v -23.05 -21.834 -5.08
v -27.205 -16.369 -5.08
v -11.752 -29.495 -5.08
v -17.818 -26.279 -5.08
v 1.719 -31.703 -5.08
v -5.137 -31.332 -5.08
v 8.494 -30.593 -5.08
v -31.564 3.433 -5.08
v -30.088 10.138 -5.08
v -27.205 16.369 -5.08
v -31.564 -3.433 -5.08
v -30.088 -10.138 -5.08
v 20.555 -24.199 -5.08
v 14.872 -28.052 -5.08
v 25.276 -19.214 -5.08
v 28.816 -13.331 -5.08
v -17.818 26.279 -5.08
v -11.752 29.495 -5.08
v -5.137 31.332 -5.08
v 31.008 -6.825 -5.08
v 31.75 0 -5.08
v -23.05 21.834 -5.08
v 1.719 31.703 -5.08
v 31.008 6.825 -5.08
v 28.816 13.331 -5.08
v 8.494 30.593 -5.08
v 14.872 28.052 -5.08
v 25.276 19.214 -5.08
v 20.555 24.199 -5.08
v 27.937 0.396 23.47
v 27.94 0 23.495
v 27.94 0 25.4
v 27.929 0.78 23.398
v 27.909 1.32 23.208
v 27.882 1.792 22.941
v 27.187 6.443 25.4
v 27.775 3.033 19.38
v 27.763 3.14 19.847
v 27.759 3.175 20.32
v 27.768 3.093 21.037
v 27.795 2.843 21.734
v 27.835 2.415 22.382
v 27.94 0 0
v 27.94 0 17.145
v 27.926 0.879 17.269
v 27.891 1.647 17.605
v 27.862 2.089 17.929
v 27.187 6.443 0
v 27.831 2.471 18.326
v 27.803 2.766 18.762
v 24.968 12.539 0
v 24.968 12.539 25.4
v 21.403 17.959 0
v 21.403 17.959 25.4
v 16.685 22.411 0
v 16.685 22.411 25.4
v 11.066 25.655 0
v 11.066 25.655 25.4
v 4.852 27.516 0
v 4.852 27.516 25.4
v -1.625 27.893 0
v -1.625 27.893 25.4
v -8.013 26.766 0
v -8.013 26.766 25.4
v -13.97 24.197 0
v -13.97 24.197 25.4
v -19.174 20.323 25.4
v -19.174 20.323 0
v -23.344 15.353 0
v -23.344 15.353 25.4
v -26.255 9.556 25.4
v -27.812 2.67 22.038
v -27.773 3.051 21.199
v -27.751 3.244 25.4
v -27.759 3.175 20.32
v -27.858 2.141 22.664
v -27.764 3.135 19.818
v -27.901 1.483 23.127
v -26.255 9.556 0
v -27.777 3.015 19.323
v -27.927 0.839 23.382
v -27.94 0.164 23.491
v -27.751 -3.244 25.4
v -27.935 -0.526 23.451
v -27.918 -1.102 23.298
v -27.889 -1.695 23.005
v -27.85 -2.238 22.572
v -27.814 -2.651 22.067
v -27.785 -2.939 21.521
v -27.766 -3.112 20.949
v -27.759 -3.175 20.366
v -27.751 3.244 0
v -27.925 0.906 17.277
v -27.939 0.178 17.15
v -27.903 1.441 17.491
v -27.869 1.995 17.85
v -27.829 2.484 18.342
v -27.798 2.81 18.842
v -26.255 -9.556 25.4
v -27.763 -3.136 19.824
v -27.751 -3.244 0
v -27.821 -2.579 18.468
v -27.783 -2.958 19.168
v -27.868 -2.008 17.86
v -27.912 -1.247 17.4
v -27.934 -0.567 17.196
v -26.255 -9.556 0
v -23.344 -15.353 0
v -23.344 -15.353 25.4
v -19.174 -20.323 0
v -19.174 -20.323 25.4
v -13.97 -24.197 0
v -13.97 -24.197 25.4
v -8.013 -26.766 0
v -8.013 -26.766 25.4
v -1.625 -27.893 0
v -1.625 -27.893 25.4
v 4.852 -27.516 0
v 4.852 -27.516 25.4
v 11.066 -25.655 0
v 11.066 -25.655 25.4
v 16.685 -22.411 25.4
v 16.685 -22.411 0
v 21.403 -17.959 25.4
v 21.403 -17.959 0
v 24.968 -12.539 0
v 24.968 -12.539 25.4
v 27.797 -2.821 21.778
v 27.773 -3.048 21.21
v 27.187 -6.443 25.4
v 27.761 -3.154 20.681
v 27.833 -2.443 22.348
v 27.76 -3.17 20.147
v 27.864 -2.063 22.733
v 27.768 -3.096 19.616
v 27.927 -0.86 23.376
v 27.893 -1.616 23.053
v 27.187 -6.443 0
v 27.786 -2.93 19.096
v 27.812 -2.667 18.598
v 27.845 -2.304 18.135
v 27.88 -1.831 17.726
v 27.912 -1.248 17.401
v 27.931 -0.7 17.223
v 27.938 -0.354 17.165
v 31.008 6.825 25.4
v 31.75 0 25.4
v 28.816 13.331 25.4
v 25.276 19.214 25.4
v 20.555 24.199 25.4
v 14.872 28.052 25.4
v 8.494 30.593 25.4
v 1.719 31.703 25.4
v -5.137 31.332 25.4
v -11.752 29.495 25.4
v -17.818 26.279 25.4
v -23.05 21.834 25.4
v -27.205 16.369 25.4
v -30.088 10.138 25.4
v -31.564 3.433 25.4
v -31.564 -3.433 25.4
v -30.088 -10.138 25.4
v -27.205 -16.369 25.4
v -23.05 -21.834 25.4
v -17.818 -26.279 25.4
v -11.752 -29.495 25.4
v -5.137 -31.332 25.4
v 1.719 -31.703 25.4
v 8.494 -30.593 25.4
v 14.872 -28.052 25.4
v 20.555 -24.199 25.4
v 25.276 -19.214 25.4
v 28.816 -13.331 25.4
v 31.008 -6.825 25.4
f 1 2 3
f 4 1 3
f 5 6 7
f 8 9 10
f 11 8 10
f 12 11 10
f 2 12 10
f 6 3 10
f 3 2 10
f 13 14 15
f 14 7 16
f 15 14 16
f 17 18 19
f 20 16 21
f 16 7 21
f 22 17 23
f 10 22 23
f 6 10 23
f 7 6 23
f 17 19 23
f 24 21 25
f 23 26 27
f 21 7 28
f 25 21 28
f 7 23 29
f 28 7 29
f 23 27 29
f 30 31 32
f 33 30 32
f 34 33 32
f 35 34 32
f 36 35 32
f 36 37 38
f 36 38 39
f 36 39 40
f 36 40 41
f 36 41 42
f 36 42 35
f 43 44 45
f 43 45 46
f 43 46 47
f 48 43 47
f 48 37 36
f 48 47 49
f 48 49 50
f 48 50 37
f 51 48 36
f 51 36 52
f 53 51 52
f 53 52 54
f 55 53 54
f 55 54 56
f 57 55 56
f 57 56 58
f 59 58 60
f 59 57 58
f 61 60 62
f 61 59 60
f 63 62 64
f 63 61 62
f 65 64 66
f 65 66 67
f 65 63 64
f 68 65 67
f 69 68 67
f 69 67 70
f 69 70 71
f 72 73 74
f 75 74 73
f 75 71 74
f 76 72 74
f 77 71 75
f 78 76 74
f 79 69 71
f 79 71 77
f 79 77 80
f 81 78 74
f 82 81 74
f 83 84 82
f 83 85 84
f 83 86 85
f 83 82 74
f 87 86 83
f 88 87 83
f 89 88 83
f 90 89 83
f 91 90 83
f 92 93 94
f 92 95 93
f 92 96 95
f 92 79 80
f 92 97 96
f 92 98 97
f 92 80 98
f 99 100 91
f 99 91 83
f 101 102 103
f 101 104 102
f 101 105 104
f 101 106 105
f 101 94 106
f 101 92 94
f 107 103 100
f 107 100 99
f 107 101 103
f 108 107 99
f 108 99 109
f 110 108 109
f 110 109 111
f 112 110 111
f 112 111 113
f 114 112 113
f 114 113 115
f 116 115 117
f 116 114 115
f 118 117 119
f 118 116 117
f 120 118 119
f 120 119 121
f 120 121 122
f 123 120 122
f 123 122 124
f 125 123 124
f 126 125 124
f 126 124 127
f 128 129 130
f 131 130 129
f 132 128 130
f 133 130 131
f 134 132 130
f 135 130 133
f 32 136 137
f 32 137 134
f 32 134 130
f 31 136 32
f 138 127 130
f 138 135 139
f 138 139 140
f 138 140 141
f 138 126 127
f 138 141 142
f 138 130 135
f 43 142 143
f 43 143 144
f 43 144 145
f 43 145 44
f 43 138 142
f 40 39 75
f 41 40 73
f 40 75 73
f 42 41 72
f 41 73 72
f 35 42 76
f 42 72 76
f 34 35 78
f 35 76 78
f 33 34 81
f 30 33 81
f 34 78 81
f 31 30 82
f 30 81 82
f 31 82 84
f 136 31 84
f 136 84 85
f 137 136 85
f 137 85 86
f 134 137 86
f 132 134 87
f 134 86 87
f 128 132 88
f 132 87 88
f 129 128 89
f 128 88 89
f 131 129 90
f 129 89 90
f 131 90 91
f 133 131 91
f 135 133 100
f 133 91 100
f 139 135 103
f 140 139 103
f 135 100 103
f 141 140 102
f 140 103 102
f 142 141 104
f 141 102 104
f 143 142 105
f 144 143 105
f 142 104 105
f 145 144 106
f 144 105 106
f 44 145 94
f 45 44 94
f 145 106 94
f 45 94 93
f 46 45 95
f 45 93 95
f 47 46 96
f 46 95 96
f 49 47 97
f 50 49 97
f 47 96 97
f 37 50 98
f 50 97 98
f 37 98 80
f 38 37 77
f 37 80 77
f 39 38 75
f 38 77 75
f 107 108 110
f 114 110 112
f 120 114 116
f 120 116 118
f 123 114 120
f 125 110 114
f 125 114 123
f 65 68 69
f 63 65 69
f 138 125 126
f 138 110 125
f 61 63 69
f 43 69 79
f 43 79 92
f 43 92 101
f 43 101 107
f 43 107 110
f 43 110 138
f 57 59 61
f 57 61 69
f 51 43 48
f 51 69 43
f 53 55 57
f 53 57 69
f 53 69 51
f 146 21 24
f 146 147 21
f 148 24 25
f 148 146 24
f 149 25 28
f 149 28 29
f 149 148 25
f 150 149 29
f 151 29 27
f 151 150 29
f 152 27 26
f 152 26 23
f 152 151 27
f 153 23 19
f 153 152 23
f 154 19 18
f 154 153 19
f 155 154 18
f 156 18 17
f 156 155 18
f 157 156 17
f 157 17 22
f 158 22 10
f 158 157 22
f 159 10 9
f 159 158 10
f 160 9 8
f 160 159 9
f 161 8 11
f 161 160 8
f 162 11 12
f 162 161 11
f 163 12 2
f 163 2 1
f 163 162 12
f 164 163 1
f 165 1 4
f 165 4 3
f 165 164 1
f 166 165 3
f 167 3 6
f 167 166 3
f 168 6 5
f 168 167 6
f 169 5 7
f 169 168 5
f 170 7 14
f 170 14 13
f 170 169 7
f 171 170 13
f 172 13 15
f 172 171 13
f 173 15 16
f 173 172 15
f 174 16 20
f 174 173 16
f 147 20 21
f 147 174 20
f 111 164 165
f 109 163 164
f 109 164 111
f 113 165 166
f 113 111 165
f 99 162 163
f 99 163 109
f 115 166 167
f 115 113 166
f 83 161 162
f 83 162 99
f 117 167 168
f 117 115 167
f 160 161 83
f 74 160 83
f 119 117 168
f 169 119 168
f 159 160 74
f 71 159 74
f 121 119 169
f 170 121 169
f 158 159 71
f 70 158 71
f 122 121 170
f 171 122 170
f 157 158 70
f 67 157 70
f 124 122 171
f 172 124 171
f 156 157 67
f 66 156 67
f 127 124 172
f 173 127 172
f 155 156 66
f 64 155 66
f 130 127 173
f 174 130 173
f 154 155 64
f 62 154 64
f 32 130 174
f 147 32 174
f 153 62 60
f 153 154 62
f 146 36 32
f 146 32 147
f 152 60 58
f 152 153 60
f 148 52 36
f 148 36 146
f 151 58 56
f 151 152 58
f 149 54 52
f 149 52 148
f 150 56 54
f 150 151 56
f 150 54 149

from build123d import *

# Parameters (mm, degrees)
F0_R          = 31.75
F0_R_2        = 27.94
F1_DEPTH      = 25.4
F2_R          = 3.175
F3_DEPTH      = 30.48
F3_DEPTH_BACK = 30.48
F4_R          = 31.75
F5_DEPTH      = 5.08


with BuildPart() as f1:
    # F0 (on Top) → F1 (new body)
    with BuildSketch(Plane.XY):
        Circle(F0_R)
        Circle(F0_R_2, mode=Mode.SUBTRACT)
    extrude(amount=F1_DEPTH)

    # F2 (on Right) → F3 (join, two sides)
    with BuildSketch(Plane.YZ) as f3_sk:
        with Locations((0, 20.32)):
            Circle(F2_R)
    extrude(amount=-F3_DEPTH)
    extrude(f3_sk.sketch, amount=F3_DEPTH_BACK)

    # F4 (on Top) → F5 (join)
    with BuildSketch(Plane.XY):
        Circle(F4_R)
    extrude(amount=-F5_DEPTH)


solid = f1.part
